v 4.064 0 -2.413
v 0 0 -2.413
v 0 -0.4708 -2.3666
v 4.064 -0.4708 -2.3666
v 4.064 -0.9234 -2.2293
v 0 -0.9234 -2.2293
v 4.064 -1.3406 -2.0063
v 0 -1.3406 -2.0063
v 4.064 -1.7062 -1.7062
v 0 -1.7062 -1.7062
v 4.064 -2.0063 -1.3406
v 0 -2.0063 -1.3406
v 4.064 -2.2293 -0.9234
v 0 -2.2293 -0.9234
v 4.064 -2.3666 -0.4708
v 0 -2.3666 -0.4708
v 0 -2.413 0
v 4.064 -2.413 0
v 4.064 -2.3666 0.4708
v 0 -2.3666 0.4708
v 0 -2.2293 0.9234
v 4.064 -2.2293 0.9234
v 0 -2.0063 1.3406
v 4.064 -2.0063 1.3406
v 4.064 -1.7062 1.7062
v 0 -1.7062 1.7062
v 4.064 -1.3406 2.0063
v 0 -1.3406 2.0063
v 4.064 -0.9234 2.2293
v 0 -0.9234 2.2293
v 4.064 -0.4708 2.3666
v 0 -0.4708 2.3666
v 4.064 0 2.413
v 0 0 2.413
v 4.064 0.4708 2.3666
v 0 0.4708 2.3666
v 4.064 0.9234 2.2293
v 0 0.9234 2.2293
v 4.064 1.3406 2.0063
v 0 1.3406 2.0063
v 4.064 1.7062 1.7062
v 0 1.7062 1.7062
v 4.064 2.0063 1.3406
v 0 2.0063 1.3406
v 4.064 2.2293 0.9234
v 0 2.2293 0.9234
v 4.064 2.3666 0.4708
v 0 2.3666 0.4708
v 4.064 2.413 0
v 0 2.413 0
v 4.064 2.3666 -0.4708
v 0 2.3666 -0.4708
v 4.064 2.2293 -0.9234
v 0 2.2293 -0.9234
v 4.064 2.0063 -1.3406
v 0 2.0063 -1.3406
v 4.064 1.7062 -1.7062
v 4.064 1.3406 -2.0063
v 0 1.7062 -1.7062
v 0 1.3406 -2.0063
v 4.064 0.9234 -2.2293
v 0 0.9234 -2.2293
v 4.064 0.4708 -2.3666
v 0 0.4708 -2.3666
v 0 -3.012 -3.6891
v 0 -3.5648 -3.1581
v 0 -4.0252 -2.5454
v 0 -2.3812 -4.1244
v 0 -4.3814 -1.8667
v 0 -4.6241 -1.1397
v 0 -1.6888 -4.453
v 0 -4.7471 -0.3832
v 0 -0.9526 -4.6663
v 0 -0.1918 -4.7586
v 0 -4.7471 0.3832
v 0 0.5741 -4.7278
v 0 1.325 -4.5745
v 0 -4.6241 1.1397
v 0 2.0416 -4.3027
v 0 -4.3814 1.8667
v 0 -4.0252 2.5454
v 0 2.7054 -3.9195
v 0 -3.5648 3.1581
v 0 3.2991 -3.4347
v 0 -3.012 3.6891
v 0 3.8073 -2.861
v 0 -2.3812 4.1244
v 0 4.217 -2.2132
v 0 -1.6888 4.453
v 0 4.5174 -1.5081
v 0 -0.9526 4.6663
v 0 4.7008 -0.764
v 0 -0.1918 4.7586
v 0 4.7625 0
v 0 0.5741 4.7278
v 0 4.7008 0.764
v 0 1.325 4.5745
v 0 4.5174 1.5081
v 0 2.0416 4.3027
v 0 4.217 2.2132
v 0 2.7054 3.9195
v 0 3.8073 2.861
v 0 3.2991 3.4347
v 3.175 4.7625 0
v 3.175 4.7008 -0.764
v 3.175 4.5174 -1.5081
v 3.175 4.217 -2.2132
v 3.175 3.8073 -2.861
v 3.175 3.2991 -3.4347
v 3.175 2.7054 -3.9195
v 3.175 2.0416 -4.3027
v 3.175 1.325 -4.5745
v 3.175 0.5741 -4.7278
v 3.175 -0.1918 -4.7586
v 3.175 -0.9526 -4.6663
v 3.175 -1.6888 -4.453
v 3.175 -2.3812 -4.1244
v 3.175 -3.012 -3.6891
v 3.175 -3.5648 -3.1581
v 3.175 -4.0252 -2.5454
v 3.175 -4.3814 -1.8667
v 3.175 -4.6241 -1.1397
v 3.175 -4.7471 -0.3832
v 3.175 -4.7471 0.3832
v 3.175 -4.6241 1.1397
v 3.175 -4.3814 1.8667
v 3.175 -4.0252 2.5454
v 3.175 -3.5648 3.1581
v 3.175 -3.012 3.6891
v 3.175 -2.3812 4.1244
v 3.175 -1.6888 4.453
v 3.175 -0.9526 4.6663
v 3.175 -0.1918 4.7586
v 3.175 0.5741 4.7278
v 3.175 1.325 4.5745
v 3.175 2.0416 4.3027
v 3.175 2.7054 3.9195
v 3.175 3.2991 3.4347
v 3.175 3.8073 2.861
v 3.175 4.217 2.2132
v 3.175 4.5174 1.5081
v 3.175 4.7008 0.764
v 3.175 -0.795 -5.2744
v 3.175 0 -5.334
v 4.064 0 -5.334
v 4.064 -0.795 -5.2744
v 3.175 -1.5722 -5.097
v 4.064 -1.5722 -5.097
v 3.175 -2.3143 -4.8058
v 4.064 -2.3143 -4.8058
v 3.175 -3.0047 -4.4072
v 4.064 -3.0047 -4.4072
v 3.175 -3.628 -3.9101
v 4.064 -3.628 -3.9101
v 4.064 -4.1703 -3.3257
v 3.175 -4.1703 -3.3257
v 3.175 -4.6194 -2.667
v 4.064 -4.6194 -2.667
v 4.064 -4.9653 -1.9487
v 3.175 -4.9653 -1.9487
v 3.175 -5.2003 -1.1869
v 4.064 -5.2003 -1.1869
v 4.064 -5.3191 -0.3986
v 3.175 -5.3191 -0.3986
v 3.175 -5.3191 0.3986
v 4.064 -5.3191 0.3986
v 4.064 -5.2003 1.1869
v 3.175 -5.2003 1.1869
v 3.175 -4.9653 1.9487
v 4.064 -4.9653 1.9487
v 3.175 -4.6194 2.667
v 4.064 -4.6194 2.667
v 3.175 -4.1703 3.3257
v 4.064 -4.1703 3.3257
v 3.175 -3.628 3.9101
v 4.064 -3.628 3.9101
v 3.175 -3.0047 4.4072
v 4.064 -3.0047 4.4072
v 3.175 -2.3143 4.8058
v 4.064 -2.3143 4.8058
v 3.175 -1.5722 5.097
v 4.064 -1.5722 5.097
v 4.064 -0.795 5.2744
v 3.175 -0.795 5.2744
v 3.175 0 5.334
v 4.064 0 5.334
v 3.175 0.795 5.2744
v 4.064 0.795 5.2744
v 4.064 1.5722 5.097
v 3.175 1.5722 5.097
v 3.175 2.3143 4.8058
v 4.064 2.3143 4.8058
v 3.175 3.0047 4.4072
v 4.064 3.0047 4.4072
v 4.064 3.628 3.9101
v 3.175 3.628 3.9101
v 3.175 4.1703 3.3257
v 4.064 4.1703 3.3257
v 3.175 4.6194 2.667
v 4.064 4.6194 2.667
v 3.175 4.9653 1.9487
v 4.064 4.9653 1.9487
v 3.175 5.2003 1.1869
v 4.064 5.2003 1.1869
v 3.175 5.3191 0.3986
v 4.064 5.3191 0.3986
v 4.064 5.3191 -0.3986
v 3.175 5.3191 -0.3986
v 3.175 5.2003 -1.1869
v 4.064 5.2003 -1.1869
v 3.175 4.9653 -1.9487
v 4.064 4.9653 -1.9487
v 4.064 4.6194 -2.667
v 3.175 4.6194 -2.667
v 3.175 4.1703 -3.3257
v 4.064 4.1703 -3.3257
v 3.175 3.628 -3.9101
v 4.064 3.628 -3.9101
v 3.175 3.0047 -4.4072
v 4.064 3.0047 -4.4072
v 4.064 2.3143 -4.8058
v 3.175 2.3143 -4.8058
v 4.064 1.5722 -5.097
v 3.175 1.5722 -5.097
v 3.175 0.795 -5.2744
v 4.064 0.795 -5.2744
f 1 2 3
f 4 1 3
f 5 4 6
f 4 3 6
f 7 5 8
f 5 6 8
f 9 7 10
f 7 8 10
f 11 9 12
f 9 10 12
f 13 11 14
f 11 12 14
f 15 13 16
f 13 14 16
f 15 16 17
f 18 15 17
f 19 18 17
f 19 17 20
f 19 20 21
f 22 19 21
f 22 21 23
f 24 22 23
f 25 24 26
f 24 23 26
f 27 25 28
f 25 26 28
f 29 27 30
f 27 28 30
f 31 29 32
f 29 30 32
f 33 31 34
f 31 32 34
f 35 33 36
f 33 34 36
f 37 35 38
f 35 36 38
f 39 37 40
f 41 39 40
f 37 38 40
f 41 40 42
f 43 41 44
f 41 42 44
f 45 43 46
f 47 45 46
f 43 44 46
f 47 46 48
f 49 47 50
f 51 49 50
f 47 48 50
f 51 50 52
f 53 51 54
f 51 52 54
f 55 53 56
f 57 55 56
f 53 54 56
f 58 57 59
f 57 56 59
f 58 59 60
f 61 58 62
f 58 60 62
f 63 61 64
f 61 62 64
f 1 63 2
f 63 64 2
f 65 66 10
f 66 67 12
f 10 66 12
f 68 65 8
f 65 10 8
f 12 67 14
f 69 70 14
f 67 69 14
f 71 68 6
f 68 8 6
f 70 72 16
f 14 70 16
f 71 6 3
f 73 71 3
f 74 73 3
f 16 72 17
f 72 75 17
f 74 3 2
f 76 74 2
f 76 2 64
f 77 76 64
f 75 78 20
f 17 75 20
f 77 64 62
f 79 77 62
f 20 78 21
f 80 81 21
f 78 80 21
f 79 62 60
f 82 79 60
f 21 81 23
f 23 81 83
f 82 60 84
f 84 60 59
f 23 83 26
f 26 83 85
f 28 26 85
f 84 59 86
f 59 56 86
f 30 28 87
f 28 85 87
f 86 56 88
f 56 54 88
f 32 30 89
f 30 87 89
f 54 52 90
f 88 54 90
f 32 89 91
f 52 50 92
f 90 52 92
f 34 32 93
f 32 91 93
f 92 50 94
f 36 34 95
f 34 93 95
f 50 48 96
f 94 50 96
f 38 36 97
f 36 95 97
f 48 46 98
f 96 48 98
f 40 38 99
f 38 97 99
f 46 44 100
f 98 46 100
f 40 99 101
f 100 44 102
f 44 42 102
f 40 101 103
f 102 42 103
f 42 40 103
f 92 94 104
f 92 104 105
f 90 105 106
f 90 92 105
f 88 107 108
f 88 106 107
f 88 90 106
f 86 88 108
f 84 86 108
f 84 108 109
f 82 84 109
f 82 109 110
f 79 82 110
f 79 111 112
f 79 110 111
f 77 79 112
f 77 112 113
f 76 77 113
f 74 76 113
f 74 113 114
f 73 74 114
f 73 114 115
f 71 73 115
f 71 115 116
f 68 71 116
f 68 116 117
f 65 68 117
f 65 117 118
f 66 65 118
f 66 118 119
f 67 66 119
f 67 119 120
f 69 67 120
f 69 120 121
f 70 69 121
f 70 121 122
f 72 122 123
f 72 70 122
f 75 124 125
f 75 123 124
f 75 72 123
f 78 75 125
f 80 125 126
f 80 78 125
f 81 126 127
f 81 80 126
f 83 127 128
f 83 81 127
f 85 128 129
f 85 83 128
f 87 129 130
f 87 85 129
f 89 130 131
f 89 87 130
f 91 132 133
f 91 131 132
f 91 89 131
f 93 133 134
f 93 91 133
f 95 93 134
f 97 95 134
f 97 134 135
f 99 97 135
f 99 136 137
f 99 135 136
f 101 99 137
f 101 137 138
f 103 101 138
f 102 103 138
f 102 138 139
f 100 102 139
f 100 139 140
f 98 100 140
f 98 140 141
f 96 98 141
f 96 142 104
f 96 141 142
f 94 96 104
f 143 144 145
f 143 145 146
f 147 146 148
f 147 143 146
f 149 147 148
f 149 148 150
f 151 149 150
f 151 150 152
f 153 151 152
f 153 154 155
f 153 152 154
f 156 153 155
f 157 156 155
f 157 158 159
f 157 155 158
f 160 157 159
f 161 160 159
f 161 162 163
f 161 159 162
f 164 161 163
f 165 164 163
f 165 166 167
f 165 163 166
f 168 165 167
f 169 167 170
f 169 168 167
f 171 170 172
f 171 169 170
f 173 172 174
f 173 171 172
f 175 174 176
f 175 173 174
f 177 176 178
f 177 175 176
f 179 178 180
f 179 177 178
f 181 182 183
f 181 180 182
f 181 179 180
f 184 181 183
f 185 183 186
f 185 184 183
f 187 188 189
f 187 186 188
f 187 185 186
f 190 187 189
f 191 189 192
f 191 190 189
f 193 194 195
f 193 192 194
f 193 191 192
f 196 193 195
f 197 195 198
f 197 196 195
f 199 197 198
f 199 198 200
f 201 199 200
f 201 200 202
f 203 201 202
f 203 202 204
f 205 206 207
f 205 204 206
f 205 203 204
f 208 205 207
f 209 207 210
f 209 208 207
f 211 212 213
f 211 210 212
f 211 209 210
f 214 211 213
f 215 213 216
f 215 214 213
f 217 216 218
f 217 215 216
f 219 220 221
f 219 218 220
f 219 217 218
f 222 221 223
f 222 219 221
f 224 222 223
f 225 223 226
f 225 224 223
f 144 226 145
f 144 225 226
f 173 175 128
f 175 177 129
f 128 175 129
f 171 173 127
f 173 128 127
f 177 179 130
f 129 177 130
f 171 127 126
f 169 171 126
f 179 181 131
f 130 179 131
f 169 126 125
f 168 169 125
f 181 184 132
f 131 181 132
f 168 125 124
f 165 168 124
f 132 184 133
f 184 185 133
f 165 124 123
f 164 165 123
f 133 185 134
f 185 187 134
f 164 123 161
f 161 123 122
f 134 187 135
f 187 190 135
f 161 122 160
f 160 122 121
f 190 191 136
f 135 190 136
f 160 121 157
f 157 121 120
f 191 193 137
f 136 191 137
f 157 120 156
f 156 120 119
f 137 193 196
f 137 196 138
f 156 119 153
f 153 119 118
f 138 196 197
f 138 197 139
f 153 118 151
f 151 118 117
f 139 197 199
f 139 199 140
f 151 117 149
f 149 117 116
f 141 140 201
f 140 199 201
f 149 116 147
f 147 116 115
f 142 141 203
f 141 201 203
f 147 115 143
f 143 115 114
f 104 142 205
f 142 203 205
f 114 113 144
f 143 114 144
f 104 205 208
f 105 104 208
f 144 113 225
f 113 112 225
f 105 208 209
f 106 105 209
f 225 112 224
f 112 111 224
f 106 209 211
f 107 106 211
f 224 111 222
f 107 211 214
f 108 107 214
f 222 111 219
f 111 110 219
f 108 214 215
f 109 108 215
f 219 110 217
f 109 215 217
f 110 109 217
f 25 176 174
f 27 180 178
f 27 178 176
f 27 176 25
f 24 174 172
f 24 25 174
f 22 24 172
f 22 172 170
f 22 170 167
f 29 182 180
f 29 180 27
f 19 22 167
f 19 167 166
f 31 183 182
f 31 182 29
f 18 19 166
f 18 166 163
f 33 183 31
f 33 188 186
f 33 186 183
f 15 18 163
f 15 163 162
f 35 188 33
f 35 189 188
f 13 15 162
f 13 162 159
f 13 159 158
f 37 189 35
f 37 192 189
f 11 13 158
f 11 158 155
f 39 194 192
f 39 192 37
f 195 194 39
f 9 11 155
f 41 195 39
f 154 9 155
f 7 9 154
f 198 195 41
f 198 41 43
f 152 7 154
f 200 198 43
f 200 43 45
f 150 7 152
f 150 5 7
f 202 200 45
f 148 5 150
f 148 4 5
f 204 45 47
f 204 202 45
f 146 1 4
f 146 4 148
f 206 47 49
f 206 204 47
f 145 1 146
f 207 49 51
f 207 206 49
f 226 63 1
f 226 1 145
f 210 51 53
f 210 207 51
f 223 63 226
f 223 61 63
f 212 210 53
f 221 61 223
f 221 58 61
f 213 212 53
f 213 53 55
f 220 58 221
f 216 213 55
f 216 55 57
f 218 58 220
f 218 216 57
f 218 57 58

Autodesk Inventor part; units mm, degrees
ref_plane "YZ Plane" through (0, 0, 0) normal (1, 0, 0) x (0, 1, 0)
ref_plane "XZ Plane" through (0, 0, 0) normal (0, 1, 0) x (-1, 0, 0)
ref_plane "XY Plane" through (0, 0, 0) normal (0, 0, 1) x (1, 0, 0)
sketch "Sketch1" plane through (0, 0, 0) normal (1, 0, 0) x (0, 1, 0)
  circle A0 centre (0, 0) radius 4.7625
  dimension "d0" = 9.525
extrude "Extrusion1" add sketch "Sketch1" along normal blind 3.175
sketch "Sketch2" plane through (3.175, 0, 0) normal (1, 0, 0) x (0, 0, -1)
  circle A0 centre (0, 0) radius 4.7625 projected
  circle A1 centre (0, 0) radius 5.334
  dimension "d4" = 10.668
extrude "Extrusion2" add sketch "Sketch2" along normal blind 0.889 contours A0 | A1
sketch "Sketch3" plane through (4.064, 0, 0) normal (1, 0, 0) x (0, 0, -1)
  circle A0 centre (0, 0) radius 5.334 projected
hole "Hole1" at (4.064, 0, 0) direction (-1, 0, 0) diameter 4.826 end through all
properties part number "Clutch Bearing" material "Brass, Soft Yellow"
